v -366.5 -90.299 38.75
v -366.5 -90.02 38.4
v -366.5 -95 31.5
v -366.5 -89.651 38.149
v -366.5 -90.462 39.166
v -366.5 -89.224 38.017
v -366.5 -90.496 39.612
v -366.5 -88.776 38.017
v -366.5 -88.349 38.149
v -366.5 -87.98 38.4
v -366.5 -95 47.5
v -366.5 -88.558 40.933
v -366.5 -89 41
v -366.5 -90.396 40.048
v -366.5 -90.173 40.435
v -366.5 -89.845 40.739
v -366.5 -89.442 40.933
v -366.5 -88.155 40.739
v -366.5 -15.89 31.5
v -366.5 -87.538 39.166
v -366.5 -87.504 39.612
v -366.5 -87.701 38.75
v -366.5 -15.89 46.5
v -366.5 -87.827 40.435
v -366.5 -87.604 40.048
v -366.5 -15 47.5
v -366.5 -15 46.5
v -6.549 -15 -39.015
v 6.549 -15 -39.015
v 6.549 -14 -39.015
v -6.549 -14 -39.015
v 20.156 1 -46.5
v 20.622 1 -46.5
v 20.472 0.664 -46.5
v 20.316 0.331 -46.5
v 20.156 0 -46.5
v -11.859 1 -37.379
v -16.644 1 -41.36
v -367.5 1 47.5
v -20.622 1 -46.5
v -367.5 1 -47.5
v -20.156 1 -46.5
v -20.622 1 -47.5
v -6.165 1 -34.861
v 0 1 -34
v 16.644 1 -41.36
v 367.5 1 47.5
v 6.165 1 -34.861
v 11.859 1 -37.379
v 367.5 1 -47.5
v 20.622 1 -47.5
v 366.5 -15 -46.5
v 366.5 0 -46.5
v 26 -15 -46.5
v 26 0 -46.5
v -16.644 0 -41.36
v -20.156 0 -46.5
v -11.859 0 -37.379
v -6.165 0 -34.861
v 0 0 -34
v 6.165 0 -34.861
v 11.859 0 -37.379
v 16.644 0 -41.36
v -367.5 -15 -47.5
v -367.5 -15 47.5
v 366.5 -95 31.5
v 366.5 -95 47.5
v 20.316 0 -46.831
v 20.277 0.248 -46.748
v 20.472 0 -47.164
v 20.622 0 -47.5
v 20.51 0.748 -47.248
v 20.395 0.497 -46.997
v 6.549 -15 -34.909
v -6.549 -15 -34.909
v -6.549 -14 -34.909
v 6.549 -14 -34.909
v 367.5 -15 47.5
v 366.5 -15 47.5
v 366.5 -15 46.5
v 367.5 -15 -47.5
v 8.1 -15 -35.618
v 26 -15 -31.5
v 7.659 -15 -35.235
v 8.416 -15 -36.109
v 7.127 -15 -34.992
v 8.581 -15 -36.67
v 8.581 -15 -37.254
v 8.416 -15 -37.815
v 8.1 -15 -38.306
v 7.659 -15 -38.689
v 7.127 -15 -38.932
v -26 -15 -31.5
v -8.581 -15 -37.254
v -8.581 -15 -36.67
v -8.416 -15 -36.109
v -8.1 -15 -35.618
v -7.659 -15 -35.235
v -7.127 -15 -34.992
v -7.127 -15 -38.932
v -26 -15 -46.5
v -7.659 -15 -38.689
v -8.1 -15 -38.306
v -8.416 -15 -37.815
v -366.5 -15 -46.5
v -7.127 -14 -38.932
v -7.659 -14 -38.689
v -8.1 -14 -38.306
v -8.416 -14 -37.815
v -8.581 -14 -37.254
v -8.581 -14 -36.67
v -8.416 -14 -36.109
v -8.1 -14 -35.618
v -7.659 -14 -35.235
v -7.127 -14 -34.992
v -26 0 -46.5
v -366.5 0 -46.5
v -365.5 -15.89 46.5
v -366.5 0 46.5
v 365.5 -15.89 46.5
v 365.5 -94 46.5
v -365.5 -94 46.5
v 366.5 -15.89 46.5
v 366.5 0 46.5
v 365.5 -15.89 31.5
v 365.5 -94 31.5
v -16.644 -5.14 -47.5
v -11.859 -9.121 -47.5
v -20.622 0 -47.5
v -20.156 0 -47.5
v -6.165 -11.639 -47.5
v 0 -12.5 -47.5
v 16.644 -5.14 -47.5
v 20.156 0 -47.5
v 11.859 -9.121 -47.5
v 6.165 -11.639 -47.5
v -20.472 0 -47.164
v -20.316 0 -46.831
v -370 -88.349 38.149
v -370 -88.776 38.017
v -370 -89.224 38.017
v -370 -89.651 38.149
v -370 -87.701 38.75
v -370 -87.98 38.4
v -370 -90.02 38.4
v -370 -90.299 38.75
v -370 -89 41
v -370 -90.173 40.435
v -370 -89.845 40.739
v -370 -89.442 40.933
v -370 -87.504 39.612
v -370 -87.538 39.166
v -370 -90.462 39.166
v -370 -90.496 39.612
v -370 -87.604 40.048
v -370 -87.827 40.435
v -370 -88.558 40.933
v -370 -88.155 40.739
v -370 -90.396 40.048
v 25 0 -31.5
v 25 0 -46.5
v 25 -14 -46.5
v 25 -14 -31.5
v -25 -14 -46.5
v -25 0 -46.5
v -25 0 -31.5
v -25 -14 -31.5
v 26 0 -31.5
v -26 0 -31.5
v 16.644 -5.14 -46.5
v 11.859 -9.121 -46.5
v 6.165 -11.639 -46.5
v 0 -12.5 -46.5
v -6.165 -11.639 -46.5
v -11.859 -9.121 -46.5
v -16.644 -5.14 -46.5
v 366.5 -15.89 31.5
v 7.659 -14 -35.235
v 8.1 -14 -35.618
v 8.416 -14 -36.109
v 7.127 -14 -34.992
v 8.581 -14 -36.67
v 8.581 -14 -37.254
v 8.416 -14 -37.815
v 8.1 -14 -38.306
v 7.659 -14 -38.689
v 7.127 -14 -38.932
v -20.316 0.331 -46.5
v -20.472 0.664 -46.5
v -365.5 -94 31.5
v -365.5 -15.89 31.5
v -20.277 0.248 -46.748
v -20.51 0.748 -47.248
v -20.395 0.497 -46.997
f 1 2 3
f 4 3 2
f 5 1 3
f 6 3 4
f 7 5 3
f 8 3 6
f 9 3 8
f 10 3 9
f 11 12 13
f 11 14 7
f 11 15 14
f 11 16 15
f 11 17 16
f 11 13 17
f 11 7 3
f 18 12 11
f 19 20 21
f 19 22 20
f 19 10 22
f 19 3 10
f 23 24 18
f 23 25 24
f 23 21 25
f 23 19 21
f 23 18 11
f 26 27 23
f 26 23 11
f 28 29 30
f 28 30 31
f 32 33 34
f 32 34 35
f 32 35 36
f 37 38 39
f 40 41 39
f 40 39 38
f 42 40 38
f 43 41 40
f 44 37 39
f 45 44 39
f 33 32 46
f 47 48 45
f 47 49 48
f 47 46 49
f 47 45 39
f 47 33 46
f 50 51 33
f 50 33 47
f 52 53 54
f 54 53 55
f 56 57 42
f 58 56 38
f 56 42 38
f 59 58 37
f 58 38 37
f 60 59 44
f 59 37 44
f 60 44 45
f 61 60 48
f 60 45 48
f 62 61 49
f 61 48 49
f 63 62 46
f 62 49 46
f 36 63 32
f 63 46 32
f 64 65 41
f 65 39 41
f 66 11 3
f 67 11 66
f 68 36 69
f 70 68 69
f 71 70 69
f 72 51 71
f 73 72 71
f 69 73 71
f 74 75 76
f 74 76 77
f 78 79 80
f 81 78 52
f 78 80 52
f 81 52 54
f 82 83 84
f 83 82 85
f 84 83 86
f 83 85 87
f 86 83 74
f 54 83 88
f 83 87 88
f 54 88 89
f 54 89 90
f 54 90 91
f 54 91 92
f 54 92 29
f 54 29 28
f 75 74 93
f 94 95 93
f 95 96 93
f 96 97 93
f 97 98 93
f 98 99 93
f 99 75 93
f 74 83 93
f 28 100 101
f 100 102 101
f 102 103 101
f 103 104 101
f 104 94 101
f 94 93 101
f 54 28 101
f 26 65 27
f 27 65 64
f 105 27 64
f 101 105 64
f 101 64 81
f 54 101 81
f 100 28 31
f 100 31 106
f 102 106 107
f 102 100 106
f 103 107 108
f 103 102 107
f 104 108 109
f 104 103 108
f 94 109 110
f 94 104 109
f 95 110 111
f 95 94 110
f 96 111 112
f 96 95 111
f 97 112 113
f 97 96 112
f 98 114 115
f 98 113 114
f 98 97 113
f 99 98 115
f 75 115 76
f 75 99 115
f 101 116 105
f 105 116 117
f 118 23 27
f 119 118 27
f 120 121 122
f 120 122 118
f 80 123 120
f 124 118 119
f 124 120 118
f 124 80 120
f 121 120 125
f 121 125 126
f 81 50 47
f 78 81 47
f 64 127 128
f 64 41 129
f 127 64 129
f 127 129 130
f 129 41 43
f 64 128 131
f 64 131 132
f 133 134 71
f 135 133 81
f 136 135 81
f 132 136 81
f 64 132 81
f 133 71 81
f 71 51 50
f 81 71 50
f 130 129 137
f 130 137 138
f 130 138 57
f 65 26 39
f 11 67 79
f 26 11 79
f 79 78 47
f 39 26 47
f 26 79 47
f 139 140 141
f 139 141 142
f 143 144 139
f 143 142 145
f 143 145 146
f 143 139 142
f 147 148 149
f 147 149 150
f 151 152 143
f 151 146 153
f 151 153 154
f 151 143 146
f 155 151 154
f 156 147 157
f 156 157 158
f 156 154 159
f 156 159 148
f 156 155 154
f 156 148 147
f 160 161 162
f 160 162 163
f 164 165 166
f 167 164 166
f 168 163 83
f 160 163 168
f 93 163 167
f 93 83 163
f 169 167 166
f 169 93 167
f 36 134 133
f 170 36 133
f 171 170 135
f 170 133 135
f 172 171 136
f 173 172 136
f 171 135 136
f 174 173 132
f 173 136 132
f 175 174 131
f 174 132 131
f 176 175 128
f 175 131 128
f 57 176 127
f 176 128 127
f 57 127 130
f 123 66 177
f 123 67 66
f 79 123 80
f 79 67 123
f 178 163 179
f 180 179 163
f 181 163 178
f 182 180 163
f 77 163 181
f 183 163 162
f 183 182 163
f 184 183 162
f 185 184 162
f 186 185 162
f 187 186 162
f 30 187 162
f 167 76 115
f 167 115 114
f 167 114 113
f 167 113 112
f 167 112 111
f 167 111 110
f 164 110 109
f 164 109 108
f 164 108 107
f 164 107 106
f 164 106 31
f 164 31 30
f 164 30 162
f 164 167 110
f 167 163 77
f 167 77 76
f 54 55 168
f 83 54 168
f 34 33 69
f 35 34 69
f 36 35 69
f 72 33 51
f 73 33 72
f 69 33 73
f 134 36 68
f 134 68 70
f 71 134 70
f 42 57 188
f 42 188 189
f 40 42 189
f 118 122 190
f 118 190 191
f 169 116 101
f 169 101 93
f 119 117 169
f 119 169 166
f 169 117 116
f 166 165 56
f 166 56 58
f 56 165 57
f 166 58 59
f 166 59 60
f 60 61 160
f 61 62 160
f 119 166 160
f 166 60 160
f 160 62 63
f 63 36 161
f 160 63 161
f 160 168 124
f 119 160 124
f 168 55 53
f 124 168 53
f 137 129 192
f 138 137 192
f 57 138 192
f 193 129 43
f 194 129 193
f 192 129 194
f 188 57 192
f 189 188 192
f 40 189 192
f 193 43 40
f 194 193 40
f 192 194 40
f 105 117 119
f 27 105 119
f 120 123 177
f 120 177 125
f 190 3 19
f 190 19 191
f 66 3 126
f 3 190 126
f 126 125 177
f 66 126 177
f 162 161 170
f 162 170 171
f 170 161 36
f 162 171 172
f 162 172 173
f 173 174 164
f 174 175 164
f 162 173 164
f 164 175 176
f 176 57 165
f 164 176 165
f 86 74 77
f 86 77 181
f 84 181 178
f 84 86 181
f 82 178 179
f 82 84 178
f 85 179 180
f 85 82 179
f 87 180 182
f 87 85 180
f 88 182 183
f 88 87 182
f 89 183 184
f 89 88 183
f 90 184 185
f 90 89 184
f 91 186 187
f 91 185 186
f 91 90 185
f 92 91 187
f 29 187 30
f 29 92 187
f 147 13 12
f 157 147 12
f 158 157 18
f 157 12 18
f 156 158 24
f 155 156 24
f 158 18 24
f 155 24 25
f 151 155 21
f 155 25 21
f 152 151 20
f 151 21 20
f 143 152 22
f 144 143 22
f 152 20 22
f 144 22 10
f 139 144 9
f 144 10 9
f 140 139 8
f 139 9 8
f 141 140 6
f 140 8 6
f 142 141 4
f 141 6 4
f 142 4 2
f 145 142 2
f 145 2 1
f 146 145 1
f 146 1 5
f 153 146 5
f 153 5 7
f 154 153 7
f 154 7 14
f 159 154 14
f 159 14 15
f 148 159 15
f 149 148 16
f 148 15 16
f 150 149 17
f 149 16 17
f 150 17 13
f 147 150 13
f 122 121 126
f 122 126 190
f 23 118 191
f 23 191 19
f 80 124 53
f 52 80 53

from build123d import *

# Parameters (mm, degrees)
CROQUIS1_W              = 735
CROQUIS1_H              = 95
SALIENTE_EXTRUIR1_DEPTH = 1
SALIENTE_EXTRUIR2_DEPTH = 15
CROQUIS3_R              = 22.5
CORTAR_EXTRUIR1_DEPTH   = 1
CROQUIS4_R              = 22.5
CORTAR_EXTRUIR2_DEPTH   = 1
CROQUIS5_W              = 1
CROQUIS5_H              = 15
SALIENTE_EXTRUIR3_DEPTH = 15
SALIENTE_EXTRUIR4_REACH = 394.5
CROQUIS6_W              = 15
CROQUIS6_H              = 1
CORTAR_EXTRUIR3_REACH   = 18
CROQUIS8_W              = 1
CROQUIS8_H              = 95
SALIENTE_EXTRUIR5_DEPTH = 733
SALIENTE_EXTRUIR6_DEPTH = 15
CROQUIS10_R             = 1.5
SALIENTE_EXTRUIR7_DEPTH = 3.5


with BuildPart() as part:
    # Croquis1 → Saliente-Extruir1 (new body)
    with BuildSketch(Plane(origin=(0, 0, 0), x_dir=(1, 0, 0), z_dir=(0, 1, 0))):
        Rectangle(CROQUIS1_W, CROQUIS1_H)
    extrude(amount=SALIENTE_EXTRUIR1_DEPTH)

    # Croquis2 → Saliente-Extruir2 (add)
    with BuildSketch(Plane.XZ):
        Polygon((366.5, 47.5), (366.5, -46.5), (-366.5, -46.5), (-366.5, 47.5), (-367.5, 47.5), (-367.5, -47.5), (367.5, -47.5), (367.5, 47.5), align=None)
    extrude(amount=SALIENTE_EXTRUIR2_DEPTH)

    # Croquis3 → Cortar-Extruir1 (cut)
    with BuildSketch(Plane(origin=(0, 0, -47.5), x_dir=(-1, 0, 0), z_dir=(0, 0, -1))):
        with Locations((0, 10)):
            Circle(CROQUIS3_R)
    extrude(amount=-CORTAR_EXTRUIR1_DEPTH, mode=Mode.SUBTRACT)

    # Croquis4 → Cortar-Extruir2 (cut)
    with BuildSketch(Plane(origin=(0, 1, 0), x_dir=(1, 0, 0), z_dir=(0, 1, 0))):
        with Locations((0, 56.5)):
            Circle(CROQUIS4_R)
    extrude(amount=-CORTAR_EXTRUIR2_DEPTH, mode=Mode.SUBTRACT)

    # Croquis5 → Saliente-Extruir3 (add)
    with BuildSketch(Plane.XZ):
        with Locations((-25.5, -39)):
            Rectangle(CROQUIS5_W, CROQUIS5_H)
        with Locations((25.5, -39)):
            Rectangle(CROQUIS5_W, CROQUIS5_H)
    extrude(amount=SALIENTE_EXTRUIR3_DEPTH)

    # Croquis6 → Saliente-Extruir4 (add, up to next)
    with BuildSketch(Plane(origin=(-25, 0, 0), x_dir=(0, 0, -1), z_dir=(1, 0, 0)), mode=Mode.PRIVATE) as saliente_extruir4_sk1:
        with Locations((39, -14.5)):
            Rectangle(CROQUIS6_W, CROQUIS6_H)
    saliente_extruir4_tool1 = extrude(saliente_extruir4_sk1.sketch, amount=SALIENTE_EXTRUIR4_REACH, mode=Mode.PRIVATE) - part.part
    add(saliente_extruir4_tool1.solids().sort_by_distance((-25, -14.5, -39))[0])

    # Croquis7 → Cortar-Extruir3 (cut, up to next)
    with BuildSketch(Plane.XZ.offset(15), mode=Mode.PRIVATE) as cortar_extruir3_sk1:
        with BuildLine():
            Line((-6.54864521, -34.909050446), (6.54864521, -34.909050446))
            ThreePointArc((6.54864521, -34.909050446), (8.601520455, -36.961925691), (6.54864521, -39.014800936))
            Line((6.54864521, -39.014800936), (-6.54864521, -39.014800936))
            ThreePointArc((-6.54864521, -39.014800936), (-8.601520455, -36.961925691), (-6.54864521, -34.909050446))
        make_face()
    cortar_extruir3_tool1 = extrude(cortar_extruir3_sk1.sketch, amount=-CORTAR_EXTRUIR3_REACH, mode=Mode.PRIVATE) & part.part
    add(cortar_extruir3_tool1.solids().sort_by_distance((0, -15, -36.961926))[0], mode=Mode.SUBTRACT)

    # Croquis8 → Saliente-Extruir5 (add)
    with BuildSketch(Plane.ZY.offset(-366.5)):
        with Locations((47, -47.5)):
            Rectangle(CROQUIS8_W, CROQUIS8_H)
    extrude(amount=SALIENTE_EXTRUIR5_DEPTH)

    # Croquis9 → Saliente-Extruir6 (add)
    with BuildSketch(Plane(origin=(0, 0, 46.5), x_dir=(-1, 0, 0), z_dir=(0, 0, -1))):
        Polygon((-366.5, -15.890406143), (-365.5, -15.890406143), (-365.5, -94), (365.5, -94), (365.5, -15.890406143), (366.5, -15.890406143), (366.5, -95), (-366.5, -95), align=None)
    extrude(amount=SALIENTE_EXTRUIR6_DEPTH)

    # Croquis10 → Saliente-Extruir7 (add)
    with BuildSketch(Plane.ZY.offset(366.5)):
        with Locations((39.5, -89)):
            Circle(CROQUIS10_R)
    extrude(amount=SALIENTE_EXTRUIR7_DEPTH)


solid = part.part
